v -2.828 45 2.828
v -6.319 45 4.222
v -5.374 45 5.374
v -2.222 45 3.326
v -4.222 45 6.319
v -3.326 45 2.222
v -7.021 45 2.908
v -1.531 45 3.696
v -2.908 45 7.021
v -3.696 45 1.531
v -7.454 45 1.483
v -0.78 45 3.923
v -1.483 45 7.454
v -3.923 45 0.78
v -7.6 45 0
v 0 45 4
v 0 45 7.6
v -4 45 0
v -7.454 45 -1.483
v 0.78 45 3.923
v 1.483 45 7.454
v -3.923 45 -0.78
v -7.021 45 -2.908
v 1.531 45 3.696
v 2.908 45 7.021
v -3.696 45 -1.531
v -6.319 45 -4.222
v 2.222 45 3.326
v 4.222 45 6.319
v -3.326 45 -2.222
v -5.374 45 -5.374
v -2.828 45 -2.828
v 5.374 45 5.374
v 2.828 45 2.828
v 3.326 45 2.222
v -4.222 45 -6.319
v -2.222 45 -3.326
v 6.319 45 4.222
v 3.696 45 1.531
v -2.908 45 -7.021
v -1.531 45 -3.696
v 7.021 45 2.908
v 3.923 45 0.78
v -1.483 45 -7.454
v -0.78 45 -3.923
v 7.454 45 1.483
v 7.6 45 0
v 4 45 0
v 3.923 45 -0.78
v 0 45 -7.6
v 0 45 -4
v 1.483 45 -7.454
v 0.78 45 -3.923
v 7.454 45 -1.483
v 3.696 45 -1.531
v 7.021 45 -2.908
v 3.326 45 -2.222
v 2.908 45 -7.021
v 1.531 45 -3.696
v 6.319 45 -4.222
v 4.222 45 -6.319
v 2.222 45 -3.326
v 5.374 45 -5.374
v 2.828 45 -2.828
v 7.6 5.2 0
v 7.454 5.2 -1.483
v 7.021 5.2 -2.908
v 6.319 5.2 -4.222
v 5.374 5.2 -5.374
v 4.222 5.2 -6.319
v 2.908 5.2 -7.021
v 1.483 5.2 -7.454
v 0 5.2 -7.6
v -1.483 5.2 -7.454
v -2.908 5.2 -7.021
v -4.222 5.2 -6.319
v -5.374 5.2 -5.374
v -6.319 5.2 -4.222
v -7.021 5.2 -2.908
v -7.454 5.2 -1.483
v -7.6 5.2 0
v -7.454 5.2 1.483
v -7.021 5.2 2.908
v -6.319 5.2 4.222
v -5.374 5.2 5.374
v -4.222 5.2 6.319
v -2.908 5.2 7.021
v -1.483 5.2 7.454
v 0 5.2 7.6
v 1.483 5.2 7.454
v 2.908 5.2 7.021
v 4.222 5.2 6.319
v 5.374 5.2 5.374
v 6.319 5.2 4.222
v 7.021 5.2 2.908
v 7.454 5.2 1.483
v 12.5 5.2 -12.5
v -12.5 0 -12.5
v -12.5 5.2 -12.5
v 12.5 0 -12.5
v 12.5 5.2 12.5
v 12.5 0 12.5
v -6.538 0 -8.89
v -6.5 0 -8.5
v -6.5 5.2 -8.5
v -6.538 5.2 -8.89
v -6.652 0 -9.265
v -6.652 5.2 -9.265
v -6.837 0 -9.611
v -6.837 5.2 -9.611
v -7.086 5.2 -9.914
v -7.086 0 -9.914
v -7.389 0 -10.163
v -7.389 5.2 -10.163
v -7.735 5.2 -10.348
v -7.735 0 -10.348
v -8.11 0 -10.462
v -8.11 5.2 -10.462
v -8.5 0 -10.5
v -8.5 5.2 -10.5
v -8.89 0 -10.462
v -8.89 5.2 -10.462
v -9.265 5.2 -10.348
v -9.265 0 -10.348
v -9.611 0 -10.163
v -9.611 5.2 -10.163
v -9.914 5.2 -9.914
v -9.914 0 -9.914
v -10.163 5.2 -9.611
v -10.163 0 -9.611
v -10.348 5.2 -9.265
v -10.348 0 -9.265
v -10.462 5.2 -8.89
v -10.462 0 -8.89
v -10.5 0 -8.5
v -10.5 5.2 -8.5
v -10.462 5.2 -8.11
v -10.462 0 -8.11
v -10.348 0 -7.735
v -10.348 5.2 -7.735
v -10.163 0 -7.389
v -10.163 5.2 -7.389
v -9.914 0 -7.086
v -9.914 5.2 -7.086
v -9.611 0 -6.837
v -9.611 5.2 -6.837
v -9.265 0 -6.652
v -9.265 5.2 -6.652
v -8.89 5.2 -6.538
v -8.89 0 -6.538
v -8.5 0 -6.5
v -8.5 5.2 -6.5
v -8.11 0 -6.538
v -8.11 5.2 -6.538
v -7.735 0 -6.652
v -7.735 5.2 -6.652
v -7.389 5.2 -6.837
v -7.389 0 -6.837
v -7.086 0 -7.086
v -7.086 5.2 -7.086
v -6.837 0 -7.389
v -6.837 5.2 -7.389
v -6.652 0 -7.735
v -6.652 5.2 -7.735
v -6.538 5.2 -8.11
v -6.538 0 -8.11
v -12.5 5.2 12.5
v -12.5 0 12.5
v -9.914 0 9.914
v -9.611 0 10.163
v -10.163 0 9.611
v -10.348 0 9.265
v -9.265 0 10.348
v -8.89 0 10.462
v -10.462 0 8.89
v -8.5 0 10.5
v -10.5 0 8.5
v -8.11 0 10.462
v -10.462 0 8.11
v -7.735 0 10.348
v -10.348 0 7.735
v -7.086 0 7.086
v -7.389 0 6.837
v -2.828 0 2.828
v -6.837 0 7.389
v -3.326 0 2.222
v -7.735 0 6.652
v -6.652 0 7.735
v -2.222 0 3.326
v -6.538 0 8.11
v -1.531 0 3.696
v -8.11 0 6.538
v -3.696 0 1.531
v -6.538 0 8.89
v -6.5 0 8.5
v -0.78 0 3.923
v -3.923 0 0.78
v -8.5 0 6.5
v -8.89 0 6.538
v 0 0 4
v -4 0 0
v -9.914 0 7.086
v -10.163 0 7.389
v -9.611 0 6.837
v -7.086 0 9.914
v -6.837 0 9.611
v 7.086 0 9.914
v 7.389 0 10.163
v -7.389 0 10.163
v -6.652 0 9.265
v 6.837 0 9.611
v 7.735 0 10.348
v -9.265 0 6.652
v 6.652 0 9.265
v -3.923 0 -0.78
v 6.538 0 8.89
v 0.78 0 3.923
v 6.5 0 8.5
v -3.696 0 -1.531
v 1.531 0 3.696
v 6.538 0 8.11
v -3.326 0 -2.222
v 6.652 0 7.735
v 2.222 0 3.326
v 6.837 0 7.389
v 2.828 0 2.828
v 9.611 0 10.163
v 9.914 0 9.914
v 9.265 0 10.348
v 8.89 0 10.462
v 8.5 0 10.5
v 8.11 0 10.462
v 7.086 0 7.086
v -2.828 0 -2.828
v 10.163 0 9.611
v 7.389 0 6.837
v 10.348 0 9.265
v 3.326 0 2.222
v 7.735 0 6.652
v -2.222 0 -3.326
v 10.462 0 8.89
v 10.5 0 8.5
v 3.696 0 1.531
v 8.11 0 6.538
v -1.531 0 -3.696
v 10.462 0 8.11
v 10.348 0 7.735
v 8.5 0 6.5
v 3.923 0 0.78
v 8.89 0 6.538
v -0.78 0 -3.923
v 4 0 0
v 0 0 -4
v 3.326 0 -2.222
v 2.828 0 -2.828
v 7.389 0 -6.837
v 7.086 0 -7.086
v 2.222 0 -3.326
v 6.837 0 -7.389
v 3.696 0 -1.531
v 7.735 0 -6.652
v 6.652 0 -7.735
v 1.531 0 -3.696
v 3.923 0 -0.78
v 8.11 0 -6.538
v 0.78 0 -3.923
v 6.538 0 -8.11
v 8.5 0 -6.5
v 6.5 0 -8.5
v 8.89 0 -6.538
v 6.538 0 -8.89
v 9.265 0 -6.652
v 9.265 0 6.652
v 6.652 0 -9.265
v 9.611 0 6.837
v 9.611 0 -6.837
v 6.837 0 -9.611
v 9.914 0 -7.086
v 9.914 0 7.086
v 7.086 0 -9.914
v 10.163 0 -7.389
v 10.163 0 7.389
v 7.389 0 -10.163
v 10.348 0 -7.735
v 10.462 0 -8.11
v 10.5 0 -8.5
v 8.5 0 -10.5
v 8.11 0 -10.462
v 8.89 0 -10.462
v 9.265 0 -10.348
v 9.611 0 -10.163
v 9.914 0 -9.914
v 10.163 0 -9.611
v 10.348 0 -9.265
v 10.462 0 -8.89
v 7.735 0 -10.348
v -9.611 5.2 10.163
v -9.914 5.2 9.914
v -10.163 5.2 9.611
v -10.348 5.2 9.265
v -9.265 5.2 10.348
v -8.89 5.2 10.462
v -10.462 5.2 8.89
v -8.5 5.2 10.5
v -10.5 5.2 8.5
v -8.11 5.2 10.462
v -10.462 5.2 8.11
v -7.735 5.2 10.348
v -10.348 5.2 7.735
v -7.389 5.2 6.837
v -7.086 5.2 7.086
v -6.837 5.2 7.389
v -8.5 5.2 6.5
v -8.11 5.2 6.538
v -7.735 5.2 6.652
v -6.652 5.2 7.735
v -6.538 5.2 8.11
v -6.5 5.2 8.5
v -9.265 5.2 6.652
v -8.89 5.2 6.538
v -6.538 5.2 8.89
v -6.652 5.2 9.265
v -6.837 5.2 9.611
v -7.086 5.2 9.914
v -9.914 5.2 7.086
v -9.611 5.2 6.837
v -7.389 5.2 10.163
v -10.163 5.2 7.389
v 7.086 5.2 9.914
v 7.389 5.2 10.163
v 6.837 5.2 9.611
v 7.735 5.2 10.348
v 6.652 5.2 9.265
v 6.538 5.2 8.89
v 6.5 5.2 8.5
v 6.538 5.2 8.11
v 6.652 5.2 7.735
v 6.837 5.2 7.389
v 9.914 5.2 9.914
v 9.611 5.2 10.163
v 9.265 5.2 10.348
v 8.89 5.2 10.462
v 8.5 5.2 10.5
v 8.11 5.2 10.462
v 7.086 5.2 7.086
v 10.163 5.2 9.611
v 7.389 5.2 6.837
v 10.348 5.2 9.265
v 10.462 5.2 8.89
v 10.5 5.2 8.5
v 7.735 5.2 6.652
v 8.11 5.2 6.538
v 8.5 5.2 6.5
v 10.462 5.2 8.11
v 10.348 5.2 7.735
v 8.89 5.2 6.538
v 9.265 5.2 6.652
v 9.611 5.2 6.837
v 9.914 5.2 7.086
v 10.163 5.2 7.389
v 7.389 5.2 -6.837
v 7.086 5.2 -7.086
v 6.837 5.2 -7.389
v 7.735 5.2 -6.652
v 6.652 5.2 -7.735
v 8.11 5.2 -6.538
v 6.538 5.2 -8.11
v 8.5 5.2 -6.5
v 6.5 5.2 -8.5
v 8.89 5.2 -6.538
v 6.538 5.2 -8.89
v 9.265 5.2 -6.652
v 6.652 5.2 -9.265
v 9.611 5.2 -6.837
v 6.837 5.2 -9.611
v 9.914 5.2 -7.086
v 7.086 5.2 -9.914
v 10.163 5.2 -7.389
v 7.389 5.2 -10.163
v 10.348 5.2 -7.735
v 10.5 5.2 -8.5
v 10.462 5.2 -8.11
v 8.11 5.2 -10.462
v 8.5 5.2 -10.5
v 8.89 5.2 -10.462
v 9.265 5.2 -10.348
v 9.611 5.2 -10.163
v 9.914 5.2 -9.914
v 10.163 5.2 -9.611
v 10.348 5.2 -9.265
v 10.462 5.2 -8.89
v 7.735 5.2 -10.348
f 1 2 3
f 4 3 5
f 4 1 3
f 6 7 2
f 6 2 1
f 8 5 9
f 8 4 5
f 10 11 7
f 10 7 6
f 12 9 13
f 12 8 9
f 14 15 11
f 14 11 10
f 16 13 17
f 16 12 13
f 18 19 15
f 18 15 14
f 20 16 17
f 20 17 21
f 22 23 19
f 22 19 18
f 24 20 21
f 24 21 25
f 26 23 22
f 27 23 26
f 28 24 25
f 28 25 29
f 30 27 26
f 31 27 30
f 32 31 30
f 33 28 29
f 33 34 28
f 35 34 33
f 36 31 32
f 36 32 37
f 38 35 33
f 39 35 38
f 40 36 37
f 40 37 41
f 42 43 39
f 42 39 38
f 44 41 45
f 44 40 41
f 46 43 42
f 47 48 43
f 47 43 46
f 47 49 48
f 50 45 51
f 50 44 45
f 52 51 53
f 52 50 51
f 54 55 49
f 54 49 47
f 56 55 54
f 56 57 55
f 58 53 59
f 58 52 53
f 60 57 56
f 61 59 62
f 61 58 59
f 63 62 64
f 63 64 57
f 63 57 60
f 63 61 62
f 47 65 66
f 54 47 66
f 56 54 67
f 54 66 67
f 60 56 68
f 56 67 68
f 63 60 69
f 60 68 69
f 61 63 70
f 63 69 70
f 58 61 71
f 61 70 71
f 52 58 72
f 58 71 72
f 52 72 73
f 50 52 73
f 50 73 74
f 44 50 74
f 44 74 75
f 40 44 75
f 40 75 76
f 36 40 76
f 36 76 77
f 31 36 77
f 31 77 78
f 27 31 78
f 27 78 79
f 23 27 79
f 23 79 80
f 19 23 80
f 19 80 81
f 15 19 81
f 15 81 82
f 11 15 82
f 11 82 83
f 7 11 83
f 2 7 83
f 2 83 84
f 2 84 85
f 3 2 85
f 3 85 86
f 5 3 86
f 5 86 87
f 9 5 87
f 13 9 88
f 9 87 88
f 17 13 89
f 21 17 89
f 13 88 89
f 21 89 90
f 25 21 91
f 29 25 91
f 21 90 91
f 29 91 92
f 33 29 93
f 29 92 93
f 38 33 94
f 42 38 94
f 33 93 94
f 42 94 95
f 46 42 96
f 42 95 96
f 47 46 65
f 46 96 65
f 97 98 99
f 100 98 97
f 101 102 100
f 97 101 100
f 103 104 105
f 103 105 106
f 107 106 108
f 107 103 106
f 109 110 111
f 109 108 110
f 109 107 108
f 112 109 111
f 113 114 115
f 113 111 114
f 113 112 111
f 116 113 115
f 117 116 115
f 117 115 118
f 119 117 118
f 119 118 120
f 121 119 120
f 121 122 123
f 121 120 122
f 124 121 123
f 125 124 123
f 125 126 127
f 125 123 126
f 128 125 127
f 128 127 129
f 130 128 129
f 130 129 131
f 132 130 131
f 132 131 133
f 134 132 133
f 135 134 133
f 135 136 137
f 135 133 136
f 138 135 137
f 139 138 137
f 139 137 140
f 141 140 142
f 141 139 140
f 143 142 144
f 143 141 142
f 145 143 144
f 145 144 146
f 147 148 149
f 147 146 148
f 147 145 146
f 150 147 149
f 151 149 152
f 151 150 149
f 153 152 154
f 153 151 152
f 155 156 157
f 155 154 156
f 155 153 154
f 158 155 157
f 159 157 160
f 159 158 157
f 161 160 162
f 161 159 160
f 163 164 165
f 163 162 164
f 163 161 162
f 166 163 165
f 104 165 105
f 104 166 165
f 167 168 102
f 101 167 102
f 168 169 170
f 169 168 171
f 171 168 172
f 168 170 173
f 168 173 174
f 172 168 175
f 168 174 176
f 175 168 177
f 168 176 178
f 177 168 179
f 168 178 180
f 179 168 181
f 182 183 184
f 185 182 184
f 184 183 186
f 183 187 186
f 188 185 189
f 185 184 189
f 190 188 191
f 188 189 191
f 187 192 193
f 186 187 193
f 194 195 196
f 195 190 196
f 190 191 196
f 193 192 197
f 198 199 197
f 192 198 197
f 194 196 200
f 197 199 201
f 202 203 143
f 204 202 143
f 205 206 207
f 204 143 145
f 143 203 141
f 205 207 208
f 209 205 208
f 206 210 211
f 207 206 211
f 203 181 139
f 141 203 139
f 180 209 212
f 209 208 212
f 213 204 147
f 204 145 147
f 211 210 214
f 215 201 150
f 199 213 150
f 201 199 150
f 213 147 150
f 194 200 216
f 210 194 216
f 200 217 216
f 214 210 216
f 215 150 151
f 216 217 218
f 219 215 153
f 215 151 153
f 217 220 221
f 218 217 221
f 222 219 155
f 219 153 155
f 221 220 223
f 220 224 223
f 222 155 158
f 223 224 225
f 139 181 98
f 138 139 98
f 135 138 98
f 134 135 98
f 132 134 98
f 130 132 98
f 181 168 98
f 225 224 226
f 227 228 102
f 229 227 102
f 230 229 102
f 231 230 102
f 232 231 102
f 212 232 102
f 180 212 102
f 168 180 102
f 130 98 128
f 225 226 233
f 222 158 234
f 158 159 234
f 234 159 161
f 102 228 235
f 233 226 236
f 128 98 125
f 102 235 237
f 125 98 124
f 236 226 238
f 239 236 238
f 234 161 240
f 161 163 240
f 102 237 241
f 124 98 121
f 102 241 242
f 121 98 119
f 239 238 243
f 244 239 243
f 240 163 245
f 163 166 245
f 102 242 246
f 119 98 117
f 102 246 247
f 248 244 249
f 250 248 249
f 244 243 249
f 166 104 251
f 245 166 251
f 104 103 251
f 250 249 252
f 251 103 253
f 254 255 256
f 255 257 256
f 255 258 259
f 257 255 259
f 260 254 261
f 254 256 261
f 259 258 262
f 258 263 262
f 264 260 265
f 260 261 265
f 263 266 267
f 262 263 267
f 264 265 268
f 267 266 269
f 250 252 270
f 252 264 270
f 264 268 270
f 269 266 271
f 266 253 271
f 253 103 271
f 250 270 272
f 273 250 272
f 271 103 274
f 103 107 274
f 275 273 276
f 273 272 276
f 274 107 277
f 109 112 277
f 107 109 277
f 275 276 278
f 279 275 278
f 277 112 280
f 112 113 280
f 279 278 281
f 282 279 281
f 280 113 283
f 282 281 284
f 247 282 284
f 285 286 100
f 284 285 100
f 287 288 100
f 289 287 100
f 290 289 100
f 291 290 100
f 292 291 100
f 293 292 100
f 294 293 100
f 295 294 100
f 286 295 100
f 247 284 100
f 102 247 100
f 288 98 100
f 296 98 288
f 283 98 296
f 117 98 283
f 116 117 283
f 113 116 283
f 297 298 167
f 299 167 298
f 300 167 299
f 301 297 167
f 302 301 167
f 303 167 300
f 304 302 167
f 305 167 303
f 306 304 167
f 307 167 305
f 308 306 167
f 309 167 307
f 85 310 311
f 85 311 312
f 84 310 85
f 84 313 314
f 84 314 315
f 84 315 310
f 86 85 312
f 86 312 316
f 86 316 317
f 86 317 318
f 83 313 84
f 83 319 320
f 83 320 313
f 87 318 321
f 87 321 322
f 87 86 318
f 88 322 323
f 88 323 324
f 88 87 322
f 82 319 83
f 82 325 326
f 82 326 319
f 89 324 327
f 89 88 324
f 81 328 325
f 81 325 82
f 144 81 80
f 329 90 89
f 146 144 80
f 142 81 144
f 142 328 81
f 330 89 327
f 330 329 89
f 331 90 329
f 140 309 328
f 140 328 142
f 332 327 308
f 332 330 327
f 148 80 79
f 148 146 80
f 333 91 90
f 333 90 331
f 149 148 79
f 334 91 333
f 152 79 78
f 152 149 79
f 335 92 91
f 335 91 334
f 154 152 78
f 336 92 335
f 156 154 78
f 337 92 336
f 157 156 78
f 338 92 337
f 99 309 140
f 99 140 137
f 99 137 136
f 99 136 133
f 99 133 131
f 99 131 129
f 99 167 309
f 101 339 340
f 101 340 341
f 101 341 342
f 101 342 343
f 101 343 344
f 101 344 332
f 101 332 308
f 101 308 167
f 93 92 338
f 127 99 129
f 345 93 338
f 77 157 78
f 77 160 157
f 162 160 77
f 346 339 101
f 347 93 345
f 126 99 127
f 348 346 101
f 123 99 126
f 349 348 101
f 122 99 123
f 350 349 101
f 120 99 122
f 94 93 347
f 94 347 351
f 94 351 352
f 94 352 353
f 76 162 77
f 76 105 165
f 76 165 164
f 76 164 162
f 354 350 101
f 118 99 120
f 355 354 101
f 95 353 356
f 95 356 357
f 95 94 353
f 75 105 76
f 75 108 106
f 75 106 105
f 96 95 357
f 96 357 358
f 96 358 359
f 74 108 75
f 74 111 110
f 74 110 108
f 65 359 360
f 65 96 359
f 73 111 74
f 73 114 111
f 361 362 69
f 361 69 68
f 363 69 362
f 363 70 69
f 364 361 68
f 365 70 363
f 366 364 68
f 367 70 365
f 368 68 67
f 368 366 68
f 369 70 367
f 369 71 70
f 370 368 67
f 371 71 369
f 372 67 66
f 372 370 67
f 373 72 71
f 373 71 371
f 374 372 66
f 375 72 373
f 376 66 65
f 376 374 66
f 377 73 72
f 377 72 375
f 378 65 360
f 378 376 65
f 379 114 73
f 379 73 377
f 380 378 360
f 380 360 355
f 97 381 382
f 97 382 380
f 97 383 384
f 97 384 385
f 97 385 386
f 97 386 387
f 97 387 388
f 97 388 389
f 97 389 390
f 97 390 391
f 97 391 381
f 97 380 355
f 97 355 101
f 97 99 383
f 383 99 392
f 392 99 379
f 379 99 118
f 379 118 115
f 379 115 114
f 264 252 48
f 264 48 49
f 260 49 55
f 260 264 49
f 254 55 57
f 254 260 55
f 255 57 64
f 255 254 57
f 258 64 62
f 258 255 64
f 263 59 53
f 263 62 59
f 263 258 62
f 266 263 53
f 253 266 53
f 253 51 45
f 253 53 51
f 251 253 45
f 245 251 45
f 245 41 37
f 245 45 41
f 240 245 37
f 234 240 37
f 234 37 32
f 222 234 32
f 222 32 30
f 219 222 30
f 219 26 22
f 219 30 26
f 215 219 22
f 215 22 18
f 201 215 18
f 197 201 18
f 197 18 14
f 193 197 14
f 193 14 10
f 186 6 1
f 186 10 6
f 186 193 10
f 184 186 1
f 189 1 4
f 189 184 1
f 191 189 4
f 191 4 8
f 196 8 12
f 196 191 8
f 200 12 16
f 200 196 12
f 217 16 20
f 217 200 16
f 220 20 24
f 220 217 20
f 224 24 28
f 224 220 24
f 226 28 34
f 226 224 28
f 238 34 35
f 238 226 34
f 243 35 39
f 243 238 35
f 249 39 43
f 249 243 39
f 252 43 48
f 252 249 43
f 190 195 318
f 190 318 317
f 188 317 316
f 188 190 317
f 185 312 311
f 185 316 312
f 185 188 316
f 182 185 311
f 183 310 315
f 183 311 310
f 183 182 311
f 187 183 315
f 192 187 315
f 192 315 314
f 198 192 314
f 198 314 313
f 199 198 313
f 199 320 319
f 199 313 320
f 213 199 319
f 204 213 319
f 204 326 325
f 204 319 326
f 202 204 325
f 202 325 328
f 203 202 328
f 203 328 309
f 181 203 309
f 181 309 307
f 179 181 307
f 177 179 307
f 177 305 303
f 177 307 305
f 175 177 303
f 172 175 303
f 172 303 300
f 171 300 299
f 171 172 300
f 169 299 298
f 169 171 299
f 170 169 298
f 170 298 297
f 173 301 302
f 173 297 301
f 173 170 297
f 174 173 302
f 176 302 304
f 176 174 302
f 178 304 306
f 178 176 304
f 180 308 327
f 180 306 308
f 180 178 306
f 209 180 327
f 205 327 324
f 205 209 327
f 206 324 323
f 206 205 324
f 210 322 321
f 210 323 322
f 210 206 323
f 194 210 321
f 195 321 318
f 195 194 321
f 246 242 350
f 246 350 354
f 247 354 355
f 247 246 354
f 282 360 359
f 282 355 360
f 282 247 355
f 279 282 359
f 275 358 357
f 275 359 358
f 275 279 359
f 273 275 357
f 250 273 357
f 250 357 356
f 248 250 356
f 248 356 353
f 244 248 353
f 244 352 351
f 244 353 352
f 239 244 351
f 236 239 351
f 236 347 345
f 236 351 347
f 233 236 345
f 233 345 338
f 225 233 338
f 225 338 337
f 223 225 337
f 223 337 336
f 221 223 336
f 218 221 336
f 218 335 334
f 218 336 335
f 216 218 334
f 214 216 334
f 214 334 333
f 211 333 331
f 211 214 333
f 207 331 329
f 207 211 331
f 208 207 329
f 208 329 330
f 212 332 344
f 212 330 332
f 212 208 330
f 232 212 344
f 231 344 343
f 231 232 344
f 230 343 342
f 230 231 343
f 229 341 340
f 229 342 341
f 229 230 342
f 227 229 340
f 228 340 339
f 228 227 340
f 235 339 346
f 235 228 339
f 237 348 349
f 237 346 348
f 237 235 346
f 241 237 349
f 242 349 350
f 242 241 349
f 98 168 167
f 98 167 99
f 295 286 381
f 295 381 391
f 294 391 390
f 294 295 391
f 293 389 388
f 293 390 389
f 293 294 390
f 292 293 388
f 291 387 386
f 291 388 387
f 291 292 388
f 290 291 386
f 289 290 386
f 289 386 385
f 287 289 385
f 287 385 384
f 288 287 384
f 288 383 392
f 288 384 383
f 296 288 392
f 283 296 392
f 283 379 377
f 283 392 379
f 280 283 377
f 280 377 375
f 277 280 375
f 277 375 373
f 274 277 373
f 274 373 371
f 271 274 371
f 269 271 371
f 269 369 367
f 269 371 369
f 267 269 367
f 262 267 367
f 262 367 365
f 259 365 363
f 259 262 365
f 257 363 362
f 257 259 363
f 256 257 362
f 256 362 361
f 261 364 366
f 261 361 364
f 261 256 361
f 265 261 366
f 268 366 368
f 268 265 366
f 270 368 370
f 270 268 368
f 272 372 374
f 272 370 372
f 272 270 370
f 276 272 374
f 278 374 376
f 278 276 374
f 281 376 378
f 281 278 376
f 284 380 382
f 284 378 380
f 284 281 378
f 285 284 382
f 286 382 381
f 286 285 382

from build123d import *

# Parameters (mm, degrees)
CYLINDER080_R          = 2
CYLINDER080_DEPTH      = 10
CYLINDER081_R          = 2
CYLINDER081_DEPTH      = 10
CYLINDER079_R          = 2
CYLINDER079_DEPTH      = 10
CYLINDER078_R          = 2
CYLINDER078_DEPTH      = 10
CYLINDER077_R          = 4
CYLINDER077_DEPTH      = 60
CYLINDER082_R          = 7.6
CYLINDER082_DEPTH      = 40
BOX027_W               = 25
BOX027_H               = 25
BOX027_DEPTH           = 5.2
CUT062_PLACEMENT_ANGLE = 90


with BuildPart() as cylinder080:
    # Cylinder080 → Cylinder080 (new body)
    with BuildSketch(Plane(origin=(21, 21, -2), x_dir=(1, 0, 0), z_dir=(0, 0, 1))):
        Circle(CYLINDER080_R)
    extrude(amount=CYLINDER080_DEPTH)


with BuildPart() as cylinder081:
    # Cylinder081 → Cylinder081 (new body)
    with BuildSketch(Plane(origin=(21, 4, -2), x_dir=(1, 0, 0), z_dir=(0, 0, 1))):
        Circle(CYLINDER081_R)
    extrude(amount=CYLINDER081_DEPTH)


with BuildPart() as cylinder079:
    # Cylinder079 → Cylinder079 (new body)
    with BuildSketch(Plane(origin=(4, 21, -2), x_dir=(1, 0, 0), z_dir=(0, 0, 1))):
        Circle(CYLINDER079_R)
    extrude(amount=CYLINDER079_DEPTH)


with BuildPart() as cylinder078:
    # Cylinder078 → Cylinder078 (new body)
    with BuildSketch(Plane(origin=(4, 4, -2), x_dir=(1, 0, 0), z_dir=(0, 0, 1))):
        Circle(CYLINDER078_R)
    extrude(amount=CYLINDER078_DEPTH)


with BuildPart() as cylinder077:
    # Cylinder077 → Cylinder077 (new body)
    with BuildSketch(Plane(origin=(12.5, 12.5, -7), x_dir=(1, 0, 0), z_dir=(0, 0, 1))):
        Circle(CYLINDER077_R)
    extrude(amount=CYLINDER077_DEPTH)


with BuildPart() as cylinder082:
    # Cylinder082 → Cylinder082 (new body)
    with BuildSketch(Plane(origin=(12.5, 12.5, 5), x_dir=(1, 0, 0), z_dir=(0, 0, 1))):
        Circle(CYLINDER082_R)
    extrude(amount=CYLINDER082_DEPTH)


with BuildPart() as cut062:
    # Box027 → Box027 (new body)
    with BuildSketch(Plane.XY):
        with Locations((12.5, 12.5)):
            Rectangle(BOX027_W, BOX027_H)
    extrude(amount=BOX027_DEPTH)

    # Fusion034: union Cylinder082
    add(cylinder082.part)

    # Cut060: cut Cylinder077
    add(cylinder077.part, mode=Mode.SUBTRACT)

    # Cut061: cut Cylinder078
    add(cylinder078.part, mode=Mode.SUBTRACT)

    # Cut058: cut Cylinder079
    add(cylinder079.part, mode=Mode.SUBTRACT)

    # Cut059: cut Cylinder081
    add(cylinder081.part, mode=Mode.SUBTRACT)

    # Cut062: cut Cylinder080
    add(cylinder080.part, mode=Mode.SUBTRACT)


with BuildPart() as cut062_1:
    # Cut062 placement: moved
    add(cut062.part.moved(Location((-12.5, 0, 12.5))).rotate(Axis((-12.5, 0, 12.5), (-1, 0, 0)), CUT062_PLACEMENT_ANGLE))


solid = cut062_1.part
